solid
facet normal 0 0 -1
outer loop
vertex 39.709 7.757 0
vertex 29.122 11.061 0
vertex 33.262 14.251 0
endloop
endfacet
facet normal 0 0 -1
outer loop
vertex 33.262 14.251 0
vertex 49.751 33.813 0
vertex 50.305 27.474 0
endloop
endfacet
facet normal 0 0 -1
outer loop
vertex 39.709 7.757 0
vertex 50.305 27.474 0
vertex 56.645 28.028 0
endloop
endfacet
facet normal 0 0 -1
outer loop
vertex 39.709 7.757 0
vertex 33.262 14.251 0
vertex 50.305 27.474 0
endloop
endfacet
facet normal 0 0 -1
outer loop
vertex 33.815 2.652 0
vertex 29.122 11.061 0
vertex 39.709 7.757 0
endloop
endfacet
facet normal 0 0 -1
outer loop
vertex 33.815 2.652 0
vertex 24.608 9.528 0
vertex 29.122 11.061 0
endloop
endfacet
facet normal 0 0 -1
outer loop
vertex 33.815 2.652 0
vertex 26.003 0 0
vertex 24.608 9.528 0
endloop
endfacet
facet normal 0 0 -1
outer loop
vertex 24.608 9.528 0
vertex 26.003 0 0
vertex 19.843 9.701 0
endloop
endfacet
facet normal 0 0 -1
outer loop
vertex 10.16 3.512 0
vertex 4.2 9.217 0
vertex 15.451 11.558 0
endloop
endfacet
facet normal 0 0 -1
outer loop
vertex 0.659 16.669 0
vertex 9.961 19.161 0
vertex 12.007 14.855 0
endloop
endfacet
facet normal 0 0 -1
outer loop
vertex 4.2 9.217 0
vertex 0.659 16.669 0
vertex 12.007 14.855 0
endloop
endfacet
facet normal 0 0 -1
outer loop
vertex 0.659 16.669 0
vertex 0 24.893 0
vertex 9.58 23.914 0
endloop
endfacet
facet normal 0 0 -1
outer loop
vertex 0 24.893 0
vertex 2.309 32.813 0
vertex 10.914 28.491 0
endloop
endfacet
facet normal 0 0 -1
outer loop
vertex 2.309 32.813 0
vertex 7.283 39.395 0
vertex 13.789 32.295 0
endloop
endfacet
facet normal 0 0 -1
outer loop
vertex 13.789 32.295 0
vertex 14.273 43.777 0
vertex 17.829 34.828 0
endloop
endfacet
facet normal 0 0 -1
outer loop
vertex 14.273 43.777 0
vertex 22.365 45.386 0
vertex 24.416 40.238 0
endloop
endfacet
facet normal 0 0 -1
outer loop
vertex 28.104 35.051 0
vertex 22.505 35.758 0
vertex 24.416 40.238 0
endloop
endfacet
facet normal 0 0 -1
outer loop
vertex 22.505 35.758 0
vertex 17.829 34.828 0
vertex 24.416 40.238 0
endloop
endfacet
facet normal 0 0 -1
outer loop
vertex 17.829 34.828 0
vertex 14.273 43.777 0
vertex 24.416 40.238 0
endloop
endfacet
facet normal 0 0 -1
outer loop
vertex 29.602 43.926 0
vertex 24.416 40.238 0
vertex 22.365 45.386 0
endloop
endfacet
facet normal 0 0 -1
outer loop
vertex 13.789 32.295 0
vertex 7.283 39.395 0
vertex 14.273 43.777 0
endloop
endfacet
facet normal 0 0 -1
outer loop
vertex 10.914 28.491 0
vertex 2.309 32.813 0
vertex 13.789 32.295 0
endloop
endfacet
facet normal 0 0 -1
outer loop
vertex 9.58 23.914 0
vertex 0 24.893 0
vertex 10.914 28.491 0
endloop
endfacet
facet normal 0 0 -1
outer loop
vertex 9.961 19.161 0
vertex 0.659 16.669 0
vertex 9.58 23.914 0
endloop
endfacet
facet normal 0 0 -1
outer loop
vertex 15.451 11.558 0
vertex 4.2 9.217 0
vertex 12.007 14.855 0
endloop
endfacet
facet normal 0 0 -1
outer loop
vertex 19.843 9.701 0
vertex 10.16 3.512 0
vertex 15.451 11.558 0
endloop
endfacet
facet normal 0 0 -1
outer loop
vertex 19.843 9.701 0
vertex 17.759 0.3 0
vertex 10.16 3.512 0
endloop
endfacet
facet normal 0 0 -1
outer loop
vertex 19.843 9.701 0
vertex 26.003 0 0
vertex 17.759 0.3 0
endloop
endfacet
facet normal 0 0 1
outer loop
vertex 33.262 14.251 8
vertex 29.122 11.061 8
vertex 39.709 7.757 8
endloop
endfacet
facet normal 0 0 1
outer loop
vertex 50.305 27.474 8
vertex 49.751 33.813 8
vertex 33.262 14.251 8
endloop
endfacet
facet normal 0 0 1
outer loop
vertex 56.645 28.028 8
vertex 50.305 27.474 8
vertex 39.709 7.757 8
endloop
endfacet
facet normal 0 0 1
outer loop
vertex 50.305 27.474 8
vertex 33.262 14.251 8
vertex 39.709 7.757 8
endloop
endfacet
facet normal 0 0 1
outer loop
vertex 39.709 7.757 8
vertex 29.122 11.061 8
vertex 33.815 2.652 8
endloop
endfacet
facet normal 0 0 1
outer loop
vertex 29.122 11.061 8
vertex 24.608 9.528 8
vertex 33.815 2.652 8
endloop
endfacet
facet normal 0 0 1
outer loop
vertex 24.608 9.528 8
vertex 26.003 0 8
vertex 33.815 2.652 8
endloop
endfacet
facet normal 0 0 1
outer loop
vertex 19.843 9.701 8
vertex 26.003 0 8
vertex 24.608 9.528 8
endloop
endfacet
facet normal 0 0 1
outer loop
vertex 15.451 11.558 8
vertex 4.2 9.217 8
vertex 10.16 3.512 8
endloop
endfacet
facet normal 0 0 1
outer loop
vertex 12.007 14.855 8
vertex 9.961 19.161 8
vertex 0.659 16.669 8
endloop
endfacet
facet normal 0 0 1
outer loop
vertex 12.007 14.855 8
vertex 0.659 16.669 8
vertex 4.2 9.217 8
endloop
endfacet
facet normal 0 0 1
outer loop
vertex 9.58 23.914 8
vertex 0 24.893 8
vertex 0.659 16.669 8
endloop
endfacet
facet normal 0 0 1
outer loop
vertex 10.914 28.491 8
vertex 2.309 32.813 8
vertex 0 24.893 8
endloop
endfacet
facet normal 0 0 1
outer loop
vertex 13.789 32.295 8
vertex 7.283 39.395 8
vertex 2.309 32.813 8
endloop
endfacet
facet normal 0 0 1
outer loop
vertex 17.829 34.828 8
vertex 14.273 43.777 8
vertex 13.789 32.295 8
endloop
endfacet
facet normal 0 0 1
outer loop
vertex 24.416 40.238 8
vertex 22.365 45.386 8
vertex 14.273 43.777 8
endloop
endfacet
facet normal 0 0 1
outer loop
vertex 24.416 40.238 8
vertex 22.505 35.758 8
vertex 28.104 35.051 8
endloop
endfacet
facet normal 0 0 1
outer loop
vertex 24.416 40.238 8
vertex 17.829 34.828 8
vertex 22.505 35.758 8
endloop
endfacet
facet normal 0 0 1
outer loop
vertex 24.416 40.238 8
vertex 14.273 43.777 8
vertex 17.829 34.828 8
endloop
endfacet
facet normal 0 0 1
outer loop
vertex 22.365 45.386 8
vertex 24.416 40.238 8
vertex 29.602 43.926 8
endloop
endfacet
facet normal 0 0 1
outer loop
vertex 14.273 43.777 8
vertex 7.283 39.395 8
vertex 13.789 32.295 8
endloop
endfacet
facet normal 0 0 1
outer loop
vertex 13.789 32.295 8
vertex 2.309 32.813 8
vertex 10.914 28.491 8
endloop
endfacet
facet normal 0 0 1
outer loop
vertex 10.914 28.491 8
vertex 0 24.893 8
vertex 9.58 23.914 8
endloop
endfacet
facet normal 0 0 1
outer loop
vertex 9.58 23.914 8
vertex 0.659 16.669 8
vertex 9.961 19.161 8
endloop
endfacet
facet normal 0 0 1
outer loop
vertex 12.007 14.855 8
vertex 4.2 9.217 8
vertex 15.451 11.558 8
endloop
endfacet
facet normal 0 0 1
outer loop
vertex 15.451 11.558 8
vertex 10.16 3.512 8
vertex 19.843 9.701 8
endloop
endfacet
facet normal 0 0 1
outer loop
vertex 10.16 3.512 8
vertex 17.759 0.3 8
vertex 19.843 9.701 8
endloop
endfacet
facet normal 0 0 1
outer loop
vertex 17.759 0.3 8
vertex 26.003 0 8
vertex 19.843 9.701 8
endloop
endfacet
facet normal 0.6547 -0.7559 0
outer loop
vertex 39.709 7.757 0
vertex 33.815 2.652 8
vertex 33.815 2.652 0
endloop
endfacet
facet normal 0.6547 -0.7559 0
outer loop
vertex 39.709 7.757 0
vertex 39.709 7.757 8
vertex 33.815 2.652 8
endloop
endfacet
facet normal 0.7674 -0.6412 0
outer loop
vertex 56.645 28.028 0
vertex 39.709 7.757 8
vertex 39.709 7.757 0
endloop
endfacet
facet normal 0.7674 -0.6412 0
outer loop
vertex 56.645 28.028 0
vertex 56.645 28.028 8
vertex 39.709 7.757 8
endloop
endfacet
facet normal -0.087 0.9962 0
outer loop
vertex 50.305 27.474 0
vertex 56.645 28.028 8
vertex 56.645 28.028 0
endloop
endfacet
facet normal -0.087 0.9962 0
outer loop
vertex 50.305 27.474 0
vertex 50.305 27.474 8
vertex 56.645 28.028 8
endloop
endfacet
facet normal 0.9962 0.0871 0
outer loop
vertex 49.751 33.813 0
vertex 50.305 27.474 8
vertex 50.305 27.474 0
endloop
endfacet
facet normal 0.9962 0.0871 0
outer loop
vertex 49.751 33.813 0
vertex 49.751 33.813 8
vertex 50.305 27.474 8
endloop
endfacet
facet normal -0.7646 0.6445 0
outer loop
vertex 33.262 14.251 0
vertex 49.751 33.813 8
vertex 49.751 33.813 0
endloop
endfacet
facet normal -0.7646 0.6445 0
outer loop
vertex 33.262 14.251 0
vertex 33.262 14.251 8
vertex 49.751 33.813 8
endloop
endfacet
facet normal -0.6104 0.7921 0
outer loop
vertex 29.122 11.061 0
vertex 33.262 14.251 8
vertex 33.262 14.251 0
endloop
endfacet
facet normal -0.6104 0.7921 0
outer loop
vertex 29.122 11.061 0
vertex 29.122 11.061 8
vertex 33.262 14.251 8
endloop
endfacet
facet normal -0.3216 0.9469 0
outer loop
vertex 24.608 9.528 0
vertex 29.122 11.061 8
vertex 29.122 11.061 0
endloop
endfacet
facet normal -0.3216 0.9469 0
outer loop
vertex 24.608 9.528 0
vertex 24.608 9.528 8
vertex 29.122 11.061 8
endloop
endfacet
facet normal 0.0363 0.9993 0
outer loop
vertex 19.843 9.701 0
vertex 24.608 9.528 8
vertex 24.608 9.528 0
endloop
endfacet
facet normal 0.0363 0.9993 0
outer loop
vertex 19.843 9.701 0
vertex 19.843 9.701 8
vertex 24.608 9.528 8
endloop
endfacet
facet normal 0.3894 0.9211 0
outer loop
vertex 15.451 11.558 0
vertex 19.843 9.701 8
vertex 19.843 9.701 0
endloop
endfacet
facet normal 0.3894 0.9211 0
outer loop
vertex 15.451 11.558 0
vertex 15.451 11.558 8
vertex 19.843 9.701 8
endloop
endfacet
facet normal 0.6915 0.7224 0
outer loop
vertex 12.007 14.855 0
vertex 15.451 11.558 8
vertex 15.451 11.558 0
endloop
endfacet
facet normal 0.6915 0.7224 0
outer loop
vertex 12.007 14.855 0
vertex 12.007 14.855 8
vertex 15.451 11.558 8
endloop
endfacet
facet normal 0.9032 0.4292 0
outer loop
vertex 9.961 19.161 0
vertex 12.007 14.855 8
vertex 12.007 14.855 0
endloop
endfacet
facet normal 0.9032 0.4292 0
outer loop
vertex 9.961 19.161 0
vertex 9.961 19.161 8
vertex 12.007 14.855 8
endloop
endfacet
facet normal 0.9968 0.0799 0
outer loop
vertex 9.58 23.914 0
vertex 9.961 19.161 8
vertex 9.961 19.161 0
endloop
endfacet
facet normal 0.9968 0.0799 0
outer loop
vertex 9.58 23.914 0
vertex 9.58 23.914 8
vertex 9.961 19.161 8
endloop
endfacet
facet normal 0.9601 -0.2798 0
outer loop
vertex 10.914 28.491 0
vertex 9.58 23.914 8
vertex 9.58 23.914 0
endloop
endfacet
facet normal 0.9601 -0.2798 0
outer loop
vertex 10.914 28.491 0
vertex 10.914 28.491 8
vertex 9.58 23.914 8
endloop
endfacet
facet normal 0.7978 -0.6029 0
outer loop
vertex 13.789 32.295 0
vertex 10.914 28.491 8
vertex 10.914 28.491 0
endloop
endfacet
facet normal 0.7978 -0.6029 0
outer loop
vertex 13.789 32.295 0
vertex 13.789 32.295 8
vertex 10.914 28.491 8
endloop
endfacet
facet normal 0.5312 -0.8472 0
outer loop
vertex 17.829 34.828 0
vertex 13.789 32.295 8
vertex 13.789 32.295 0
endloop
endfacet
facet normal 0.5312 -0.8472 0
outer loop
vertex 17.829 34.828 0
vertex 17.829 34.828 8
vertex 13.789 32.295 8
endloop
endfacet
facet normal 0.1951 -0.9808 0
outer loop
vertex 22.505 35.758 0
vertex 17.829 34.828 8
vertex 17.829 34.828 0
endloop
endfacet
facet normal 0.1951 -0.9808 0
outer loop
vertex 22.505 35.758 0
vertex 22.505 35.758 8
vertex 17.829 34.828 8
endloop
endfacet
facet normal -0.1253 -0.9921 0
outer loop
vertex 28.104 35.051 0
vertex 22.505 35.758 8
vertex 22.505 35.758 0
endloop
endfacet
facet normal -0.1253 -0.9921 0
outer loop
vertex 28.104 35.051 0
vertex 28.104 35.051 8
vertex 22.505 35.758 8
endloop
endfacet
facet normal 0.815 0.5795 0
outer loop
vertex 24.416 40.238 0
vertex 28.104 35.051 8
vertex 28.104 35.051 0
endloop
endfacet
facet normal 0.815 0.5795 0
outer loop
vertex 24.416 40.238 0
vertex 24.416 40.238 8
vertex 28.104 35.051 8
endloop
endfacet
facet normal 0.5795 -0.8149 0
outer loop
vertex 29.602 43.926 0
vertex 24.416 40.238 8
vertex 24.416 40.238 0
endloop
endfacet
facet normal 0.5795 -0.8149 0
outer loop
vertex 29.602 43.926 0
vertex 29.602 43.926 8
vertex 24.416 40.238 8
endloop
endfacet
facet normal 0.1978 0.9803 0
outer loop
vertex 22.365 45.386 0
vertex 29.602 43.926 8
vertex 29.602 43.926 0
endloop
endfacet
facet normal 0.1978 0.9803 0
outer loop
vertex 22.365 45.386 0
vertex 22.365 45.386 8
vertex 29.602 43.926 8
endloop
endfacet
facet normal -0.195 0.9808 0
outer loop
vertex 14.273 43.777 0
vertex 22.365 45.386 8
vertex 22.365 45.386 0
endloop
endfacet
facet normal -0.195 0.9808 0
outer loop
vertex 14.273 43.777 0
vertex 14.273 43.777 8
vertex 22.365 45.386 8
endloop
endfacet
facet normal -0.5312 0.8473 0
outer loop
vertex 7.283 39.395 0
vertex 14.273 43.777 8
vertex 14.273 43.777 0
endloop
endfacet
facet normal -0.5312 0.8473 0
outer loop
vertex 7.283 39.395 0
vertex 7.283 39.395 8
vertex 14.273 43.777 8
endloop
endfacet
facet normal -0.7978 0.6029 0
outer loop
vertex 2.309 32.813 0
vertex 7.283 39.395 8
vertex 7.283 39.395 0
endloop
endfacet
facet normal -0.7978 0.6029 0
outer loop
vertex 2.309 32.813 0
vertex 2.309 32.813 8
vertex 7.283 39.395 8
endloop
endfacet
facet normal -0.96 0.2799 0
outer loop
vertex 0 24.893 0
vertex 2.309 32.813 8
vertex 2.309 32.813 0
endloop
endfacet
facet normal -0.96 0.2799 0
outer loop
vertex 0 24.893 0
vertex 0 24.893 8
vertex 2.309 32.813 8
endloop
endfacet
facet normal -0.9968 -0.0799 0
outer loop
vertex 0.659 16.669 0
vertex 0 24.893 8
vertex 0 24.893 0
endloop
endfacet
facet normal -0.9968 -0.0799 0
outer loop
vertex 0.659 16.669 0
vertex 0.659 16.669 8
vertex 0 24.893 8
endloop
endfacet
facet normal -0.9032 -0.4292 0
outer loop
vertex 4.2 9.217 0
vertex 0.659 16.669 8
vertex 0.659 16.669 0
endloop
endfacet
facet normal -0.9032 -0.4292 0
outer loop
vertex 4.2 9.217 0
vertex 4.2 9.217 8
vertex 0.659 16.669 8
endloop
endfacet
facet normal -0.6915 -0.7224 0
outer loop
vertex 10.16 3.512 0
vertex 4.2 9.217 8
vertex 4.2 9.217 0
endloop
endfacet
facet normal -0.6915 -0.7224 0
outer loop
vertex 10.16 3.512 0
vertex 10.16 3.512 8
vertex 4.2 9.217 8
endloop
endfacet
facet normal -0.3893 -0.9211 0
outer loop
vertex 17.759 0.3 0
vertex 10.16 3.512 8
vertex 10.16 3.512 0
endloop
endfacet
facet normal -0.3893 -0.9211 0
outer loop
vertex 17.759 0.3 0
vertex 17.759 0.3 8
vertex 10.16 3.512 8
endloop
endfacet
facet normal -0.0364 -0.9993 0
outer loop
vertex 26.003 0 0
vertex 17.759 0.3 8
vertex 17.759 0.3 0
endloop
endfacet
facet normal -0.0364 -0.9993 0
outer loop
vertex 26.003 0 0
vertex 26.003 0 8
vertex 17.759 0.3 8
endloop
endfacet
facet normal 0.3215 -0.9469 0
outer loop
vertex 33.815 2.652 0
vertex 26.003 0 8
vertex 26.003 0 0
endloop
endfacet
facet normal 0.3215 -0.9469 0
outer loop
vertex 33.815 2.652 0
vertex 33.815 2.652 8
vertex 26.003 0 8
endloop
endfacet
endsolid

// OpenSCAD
$fn = 32;

// ----------------------------------------------------------------------
// Eye lug: ring_tail, 8 mm thick
// ----------------------------------------------------------------------

// --- parameters (mm) ---
profile_height = 8;       // extrusion height
profile_points = 30;      // points of the closed outline

profile = [[24.416, 40.238], [29.602, 43.926], [22.365, 45.386], [14.273, 43.777], [7.283, 39.395], [2.309, 32.813], [0, 24.893], [0.659, 16.669], [4.2, 9.217], [10.16, 3.512], [17.759, 0.3], [26.003, 0], [33.815, 2.652], [39.709, 7.757], [56.645, 28.028], [50.305, 27.474], [49.751, 33.813], [33.262, 14.251], [29.122, 11.061], [24.608, 9.528], [19.843, 9.701], [15.451, 11.558], [12.007, 14.855], [9.961, 19.161], [9.58, 23.914], [10.914, 28.491], [13.789, 32.295], [17.829, 34.828], [22.505, 35.758], [28.104, 35.051]];  // single closed polygon, 30 points, counter clockwise

// --- the one profile operation ---
linear_extrude(height = profile_height) polygon(points = profile);
